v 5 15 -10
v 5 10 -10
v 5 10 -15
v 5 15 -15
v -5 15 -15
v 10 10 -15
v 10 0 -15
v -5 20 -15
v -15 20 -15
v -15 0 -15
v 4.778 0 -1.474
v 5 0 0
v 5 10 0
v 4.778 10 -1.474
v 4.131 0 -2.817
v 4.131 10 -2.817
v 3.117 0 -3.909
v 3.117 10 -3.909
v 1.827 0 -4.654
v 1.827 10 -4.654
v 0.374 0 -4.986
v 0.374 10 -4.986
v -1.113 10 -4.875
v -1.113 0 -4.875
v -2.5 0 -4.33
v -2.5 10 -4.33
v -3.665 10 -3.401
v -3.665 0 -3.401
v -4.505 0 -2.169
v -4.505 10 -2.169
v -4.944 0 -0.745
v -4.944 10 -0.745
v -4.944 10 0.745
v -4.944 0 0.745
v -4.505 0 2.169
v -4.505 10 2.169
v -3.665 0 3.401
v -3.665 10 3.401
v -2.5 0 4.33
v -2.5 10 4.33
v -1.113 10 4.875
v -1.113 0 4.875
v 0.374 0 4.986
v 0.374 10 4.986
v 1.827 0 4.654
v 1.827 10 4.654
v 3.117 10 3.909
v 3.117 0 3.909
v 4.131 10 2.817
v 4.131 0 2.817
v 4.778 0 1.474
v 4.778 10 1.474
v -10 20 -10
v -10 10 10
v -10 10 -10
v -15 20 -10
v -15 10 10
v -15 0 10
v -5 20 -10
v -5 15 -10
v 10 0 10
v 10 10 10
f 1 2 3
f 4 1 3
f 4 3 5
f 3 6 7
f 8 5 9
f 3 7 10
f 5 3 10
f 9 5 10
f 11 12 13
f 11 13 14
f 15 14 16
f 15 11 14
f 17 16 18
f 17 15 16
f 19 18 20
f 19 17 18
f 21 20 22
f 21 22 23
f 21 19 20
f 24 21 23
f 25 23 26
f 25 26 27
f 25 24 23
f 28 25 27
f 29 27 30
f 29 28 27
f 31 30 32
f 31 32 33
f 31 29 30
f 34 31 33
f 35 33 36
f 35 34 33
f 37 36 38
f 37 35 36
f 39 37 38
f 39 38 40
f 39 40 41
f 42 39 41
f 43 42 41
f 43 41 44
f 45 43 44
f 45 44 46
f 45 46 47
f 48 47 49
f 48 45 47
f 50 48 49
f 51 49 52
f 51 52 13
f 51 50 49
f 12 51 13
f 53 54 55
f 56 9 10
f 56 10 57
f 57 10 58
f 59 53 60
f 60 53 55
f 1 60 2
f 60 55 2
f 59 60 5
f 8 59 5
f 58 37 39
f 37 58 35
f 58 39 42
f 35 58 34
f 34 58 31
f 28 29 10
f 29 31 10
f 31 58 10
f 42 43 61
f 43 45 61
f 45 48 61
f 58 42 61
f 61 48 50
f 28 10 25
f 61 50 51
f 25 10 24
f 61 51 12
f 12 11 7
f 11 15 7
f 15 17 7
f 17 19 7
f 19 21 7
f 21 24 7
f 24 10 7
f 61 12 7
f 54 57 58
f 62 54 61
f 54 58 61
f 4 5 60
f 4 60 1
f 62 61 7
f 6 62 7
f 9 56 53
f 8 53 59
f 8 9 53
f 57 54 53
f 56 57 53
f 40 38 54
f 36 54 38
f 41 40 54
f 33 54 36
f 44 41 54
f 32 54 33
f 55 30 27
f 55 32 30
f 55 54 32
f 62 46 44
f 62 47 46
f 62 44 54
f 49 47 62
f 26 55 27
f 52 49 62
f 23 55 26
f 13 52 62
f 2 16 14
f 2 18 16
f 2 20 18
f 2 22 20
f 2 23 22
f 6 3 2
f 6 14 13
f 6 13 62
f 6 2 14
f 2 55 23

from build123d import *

# Parameters (mm, degrees)
SKETCH_1_R          = 5
EXTRUDE_1_DEPTH     = 10
SKETCH_1_3_W        = 10
SKETCH_1_3_H        = 5
EXTRUDE_2_DEPTH     = 15
EXTRUDE_3_DEPTH     = 20
CUT_EXTRUDE_1_DEPTH = 20


with BuildPart() as part:
    # 草圖1 → 填料-伸長1 (new body)
    with BuildSketch(Plane(origin=(0, 0, 0), x_dir=(1, 0, 0), z_dir=(0, 1, 0))):
        Polygon((10, 15), (5, 15), (5, 10), (-5, 10), (-10, 10), (-10, -10), (10, -10), align=None)
        Circle(SKETCH_1_R, mode=Mode.SUBTRACT)
    extrude(amount=EXTRUDE_1_DEPTH)

    # 草圖1<3> → 填料-伸長2 (add)
    with BuildSketch(Plane(origin=(0, 0, 0), x_dir=(1, 0, 0), z_dir=(0, 1, 0))):
        with Locations((0, 12.5)):
            Rectangle(SKETCH_1_3_W, SKETCH_1_3_H)
    extrude(amount=EXTRUDE_2_DEPTH)

    # 草圖1<4> → 填料-伸長3 (add)
    with BuildSketch(Plane(origin=(0, 0, 0), x_dir=(1, 0, 0), z_dir=(0, 1, 0))):
        Polygon((-5, 15), (-15, 15), (-15, -10), (-10, -10), (-10, 10), (-5, 10), align=None)
    extrude(amount=EXTRUDE_3_DEPTH)

    # 草圖2 → 除料-伸長1 (cut)
    with BuildSketch(Plane(origin=(-10, 0, 0), x_dir=(0, 0, -1), z_dir=(1, 0, 0))):
        Polygon((-10, 10), (10, 20), (-10, 20), align=None)
    extrude(amount=-CUT_EXTRUDE_1_DEPTH, mode=Mode.SUBTRACT)


solid = part.part
